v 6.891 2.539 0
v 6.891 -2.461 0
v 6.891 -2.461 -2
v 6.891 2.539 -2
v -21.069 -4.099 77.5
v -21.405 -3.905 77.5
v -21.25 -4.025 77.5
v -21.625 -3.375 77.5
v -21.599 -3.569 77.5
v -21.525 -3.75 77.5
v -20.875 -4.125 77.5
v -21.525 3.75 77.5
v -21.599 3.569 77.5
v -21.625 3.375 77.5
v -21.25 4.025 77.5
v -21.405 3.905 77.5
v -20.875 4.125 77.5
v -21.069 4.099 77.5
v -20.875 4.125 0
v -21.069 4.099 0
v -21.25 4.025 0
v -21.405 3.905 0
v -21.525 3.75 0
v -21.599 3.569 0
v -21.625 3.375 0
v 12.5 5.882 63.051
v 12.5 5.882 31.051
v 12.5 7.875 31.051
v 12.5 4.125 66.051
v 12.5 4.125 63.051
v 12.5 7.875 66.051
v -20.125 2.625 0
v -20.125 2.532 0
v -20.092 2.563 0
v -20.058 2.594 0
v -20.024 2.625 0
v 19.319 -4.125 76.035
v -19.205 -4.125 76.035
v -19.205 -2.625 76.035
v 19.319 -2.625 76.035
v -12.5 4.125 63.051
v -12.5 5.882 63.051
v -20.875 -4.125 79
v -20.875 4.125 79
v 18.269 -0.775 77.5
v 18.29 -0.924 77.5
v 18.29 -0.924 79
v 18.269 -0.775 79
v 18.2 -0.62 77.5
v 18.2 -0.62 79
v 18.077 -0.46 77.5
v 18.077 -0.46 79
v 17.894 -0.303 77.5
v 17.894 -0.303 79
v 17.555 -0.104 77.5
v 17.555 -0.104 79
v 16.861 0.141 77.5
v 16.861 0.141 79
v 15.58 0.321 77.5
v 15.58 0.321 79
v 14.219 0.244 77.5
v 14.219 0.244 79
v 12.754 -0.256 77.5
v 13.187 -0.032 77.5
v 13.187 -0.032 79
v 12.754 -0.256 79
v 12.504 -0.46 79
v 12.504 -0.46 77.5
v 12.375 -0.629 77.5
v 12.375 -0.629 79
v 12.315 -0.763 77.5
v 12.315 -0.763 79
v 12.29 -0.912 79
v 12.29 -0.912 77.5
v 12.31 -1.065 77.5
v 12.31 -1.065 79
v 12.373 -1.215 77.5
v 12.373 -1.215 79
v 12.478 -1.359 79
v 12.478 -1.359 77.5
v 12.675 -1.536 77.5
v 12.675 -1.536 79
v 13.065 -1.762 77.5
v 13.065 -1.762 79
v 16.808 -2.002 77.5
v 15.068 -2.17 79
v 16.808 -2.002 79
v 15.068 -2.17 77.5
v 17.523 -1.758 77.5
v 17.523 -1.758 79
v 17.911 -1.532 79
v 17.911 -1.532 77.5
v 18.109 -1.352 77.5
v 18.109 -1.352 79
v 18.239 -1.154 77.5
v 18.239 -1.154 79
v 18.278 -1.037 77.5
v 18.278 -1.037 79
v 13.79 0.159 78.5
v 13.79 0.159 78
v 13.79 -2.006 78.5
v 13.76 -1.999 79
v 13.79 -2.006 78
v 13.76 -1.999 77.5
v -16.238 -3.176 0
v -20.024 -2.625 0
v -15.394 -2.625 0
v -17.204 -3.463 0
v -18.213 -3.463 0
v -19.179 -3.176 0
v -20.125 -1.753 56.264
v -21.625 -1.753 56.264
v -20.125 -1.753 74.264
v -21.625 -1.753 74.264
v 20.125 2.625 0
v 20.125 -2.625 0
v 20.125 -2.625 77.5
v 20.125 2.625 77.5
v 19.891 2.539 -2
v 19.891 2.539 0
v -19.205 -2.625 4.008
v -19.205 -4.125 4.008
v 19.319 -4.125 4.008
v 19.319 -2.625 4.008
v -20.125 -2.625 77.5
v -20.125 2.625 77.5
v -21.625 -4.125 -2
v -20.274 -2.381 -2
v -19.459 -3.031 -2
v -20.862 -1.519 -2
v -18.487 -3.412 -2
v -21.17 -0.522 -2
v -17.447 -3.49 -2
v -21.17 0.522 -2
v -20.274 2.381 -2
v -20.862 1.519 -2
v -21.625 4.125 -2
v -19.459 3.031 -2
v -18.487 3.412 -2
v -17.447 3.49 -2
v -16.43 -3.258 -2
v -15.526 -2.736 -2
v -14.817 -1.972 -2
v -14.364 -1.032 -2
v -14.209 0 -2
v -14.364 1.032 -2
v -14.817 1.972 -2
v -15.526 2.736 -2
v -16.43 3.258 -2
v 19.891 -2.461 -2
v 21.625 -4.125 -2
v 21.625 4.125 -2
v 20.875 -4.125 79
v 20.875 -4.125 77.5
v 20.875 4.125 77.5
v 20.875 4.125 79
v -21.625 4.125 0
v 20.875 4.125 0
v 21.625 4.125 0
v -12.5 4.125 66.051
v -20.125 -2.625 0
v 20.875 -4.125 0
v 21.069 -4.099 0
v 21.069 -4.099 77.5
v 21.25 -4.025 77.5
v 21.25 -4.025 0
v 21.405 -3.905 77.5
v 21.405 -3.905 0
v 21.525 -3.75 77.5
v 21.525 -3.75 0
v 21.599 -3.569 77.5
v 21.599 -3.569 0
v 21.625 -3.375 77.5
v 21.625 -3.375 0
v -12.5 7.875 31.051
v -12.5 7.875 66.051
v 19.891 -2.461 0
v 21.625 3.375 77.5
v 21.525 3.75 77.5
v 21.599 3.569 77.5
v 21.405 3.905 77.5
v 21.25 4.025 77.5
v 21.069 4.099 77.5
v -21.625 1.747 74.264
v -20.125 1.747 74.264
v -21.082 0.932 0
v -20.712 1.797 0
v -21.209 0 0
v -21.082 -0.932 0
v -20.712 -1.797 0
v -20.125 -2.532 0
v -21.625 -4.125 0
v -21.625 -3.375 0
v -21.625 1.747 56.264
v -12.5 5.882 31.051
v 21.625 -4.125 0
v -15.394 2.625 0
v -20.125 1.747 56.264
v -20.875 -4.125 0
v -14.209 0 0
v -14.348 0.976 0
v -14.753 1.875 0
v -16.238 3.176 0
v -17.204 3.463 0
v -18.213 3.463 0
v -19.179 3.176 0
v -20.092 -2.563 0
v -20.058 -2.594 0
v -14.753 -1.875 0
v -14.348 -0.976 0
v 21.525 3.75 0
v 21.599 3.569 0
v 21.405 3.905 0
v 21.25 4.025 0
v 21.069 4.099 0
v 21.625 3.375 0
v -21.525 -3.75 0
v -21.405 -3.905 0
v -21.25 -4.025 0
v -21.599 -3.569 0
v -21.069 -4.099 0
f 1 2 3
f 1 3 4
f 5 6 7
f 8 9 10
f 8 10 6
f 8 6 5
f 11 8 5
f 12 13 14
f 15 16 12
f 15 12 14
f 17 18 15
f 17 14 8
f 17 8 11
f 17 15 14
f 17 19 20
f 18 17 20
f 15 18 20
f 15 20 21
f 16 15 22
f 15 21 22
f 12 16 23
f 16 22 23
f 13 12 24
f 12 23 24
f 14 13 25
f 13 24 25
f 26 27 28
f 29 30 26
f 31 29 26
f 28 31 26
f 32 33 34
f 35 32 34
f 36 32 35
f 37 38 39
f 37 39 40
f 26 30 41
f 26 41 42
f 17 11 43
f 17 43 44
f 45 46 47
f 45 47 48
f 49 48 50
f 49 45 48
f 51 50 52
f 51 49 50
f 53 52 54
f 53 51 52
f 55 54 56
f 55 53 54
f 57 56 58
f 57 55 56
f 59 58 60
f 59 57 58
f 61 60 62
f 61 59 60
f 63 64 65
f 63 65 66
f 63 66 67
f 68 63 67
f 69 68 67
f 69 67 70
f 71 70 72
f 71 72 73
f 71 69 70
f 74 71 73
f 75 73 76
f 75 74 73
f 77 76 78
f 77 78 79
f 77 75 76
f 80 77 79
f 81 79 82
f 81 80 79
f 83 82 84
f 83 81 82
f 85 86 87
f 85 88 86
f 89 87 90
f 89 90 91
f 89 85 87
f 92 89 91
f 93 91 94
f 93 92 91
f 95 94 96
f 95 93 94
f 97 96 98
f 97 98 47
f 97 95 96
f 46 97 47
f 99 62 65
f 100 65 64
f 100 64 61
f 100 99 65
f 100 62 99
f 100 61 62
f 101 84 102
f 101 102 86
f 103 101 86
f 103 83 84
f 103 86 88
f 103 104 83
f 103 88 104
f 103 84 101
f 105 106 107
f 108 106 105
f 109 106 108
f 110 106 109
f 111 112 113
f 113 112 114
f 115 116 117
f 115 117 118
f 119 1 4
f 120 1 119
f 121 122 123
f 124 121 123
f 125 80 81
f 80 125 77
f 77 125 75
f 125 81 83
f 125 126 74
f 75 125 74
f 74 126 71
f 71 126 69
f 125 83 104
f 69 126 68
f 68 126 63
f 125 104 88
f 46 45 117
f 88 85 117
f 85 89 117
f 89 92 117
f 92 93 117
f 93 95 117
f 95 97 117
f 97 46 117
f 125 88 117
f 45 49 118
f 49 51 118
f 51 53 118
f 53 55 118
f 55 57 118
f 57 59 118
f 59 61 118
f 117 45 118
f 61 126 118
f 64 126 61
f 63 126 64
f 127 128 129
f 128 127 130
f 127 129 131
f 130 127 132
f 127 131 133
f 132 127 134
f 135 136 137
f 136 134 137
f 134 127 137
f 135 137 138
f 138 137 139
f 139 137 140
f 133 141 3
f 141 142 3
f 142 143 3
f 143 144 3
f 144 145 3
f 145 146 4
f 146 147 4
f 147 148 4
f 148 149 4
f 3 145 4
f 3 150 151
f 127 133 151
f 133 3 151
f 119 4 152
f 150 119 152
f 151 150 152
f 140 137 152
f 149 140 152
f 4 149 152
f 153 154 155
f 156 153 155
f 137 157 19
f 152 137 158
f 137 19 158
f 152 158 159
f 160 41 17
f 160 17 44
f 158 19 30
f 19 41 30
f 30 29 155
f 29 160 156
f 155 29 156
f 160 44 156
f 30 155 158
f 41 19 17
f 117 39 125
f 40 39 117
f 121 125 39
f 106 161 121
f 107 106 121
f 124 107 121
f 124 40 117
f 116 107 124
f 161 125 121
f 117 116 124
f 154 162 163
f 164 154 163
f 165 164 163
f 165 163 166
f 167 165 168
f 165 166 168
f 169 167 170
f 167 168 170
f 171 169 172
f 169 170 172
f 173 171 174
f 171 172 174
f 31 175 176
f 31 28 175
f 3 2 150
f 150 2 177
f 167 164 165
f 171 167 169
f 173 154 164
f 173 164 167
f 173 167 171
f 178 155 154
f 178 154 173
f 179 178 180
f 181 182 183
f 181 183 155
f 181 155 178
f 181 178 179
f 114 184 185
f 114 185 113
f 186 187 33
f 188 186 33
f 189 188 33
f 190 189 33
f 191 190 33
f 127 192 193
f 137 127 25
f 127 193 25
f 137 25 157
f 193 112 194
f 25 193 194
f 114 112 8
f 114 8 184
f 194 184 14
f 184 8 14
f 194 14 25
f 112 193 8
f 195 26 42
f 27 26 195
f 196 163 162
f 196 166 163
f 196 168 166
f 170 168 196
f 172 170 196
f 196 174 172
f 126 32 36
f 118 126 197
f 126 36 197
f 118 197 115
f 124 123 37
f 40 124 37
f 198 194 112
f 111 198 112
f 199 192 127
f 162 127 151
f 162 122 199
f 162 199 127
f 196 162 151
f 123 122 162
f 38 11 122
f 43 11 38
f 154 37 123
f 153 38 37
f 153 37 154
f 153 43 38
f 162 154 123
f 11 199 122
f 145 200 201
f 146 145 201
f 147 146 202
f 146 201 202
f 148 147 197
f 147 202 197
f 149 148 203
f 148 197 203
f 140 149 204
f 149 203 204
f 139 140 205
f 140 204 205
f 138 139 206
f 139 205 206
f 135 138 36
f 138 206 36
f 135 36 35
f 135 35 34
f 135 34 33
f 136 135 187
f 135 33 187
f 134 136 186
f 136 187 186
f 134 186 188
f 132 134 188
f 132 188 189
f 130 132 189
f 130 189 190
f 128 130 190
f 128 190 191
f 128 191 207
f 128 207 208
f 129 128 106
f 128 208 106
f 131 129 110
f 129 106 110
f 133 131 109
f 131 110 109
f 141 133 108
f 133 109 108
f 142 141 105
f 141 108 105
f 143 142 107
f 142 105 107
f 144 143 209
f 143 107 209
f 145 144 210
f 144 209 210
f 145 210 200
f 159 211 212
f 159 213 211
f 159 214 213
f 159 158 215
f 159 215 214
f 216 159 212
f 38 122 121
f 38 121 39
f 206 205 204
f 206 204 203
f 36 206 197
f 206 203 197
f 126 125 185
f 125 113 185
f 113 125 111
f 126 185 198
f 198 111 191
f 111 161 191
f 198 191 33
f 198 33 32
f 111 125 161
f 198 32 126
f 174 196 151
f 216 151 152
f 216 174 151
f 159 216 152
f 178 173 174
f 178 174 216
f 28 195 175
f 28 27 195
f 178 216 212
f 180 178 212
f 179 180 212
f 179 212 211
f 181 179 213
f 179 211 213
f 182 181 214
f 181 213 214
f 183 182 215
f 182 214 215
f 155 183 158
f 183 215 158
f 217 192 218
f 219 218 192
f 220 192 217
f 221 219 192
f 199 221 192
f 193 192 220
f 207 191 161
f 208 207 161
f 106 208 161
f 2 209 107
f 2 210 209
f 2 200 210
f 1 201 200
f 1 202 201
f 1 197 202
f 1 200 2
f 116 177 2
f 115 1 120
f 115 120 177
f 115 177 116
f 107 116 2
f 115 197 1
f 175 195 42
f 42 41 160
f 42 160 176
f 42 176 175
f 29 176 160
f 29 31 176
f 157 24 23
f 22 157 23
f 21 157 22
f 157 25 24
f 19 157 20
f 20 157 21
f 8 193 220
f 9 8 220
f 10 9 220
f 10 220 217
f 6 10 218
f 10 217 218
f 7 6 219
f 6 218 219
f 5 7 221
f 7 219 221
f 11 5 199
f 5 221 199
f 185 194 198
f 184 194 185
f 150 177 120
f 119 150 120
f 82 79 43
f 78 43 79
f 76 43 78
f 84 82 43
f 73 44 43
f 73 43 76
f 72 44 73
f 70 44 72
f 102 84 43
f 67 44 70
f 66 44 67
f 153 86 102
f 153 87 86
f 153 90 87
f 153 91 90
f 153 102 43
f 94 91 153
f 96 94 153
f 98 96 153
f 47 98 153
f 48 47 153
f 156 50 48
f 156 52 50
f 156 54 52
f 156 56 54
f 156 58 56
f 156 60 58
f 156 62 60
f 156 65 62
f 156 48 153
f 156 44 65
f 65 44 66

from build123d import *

# Parameters (mm, degrees)
F0_W      = 40.25
F0_H      = 5.25
F1_DEPTH  = 77.5
F2_W      = 38.52346
F2_H      = 72.027471
F3_DEPTH  = 5
F4_W      = 41.75
F4_H      = 8.25
F5_DEPTH  = 1.5
F6_W      = 43.25
F6_H      = 8.25
F6_R      = 3.5
F6_W_2    = 13
F6_H_2    = 5
F7_DEPTH  = 2
F8_W      = 3.5
F8_H      = 18
F9_DEPTH  = 5
F11_DEPTH = 12.5


with BuildPart() as f1:
    # F0 (on Top) → F1 (new body)
    with BuildSketch(Plane.XY):
        with BuildLine():
            Line((-21.625, 3.375), (-21.625, -3.375))
            ThreePointArc((-21.625, -3.375), (-21.40533, -3.90533), (-20.875, -4.125))
            Line((-20.875, -4.125), (20.875, -4.125))
            ThreePointArc((20.875, -4.125), (21.40533, -3.90533), (21.625, -3.375))
            Line((21.625, -3.375), (21.625, 3.375))
            ThreePointArc((21.625, 3.375), (21.40533, 3.90533), (20.875, 4.125))
            Line((20.875, 4.125), (-20.875, 4.125))
            ThreePointArc((-20.875, 4.125), (-21.40533, 3.90533), (-21.625, 3.375))
        make_face()
        Rectangle(F0_W, F0_H, mode=Mode.SUBTRACT)
    extrude(amount=F1_DEPTH)

    # F2 (on face) → F3 (cut)
    with BuildSketch(Plane.XZ.offset(4.125)):
        with Locations((0.057188, 40.02151)):
            Rectangle(F2_W, F2_H)
    extrude(amount=-F3_DEPTH, mode=Mode.SUBTRACT)

    # F4 (on face) → F5 (join)
    with BuildSketch(Plane.XY.offset(77.5)):
        Rectangle(F4_W, F4_H)
        with BuildLine():
            add(Edge.make_bspline(
                [(18.290351, -0.923601), (18.290351, 1.241462), (13.790351, 0.158931), (9.290351, -0.923601), (13.790351, -2.006133), (18.290351, -3.088665), (18.290351, -0.923601)],
                knots=[0, 0, 0, 2.094395, 2.094395, 4.18879, 4.18879, 6.283185, 6.283185, 6.283185], degree=2, weights=[1, 0.5, 1, 0.5, 1, 0.5, 1]))
        make_face(mode=Mode.SUBTRACT)
    extrude(amount=F5_DEPTH)

    # F6 (on Top) → F7 (join)
    with BuildSketch(Plane.XY):
        Rectangle(F6_W, F6_H)
        with Locations((-17.708602, 0)):
            Circle(F6_R, mode=Mode.SUBTRACT)
        with Locations((13.390783, 0.038613)):
            Rectangle(F6_W_2, F6_H_2, mode=Mode.SUBTRACT)
    extrude(amount=-F7_DEPTH)

    # F8 (on face) → F9 (cut)
    with BuildSketch(Plane(origin=(-21.625, 0, 0), x_dir=(0, -1, 0), z_dir=(-1, 0, 0))):
        with Locations((0.002663, 65.263712)):
            Rectangle(F8_W, F8_H)
    extrude(amount=-F9_DEPTH, mode=Mode.SUBTRACT)

    # F10 (on Right) → F11 (join, symmetric)
    with BuildSketch(Plane.YZ):
        Polygon((7.875, 66.051362), (4.125, 66.051362), (4.125, 63.051362), (5.882013, 63.051362), (5.882013, 31.051362), (7.875, 31.051362), align=None)
    extrude(amount=F11_DEPTH, both=True)


solid = f1.part
